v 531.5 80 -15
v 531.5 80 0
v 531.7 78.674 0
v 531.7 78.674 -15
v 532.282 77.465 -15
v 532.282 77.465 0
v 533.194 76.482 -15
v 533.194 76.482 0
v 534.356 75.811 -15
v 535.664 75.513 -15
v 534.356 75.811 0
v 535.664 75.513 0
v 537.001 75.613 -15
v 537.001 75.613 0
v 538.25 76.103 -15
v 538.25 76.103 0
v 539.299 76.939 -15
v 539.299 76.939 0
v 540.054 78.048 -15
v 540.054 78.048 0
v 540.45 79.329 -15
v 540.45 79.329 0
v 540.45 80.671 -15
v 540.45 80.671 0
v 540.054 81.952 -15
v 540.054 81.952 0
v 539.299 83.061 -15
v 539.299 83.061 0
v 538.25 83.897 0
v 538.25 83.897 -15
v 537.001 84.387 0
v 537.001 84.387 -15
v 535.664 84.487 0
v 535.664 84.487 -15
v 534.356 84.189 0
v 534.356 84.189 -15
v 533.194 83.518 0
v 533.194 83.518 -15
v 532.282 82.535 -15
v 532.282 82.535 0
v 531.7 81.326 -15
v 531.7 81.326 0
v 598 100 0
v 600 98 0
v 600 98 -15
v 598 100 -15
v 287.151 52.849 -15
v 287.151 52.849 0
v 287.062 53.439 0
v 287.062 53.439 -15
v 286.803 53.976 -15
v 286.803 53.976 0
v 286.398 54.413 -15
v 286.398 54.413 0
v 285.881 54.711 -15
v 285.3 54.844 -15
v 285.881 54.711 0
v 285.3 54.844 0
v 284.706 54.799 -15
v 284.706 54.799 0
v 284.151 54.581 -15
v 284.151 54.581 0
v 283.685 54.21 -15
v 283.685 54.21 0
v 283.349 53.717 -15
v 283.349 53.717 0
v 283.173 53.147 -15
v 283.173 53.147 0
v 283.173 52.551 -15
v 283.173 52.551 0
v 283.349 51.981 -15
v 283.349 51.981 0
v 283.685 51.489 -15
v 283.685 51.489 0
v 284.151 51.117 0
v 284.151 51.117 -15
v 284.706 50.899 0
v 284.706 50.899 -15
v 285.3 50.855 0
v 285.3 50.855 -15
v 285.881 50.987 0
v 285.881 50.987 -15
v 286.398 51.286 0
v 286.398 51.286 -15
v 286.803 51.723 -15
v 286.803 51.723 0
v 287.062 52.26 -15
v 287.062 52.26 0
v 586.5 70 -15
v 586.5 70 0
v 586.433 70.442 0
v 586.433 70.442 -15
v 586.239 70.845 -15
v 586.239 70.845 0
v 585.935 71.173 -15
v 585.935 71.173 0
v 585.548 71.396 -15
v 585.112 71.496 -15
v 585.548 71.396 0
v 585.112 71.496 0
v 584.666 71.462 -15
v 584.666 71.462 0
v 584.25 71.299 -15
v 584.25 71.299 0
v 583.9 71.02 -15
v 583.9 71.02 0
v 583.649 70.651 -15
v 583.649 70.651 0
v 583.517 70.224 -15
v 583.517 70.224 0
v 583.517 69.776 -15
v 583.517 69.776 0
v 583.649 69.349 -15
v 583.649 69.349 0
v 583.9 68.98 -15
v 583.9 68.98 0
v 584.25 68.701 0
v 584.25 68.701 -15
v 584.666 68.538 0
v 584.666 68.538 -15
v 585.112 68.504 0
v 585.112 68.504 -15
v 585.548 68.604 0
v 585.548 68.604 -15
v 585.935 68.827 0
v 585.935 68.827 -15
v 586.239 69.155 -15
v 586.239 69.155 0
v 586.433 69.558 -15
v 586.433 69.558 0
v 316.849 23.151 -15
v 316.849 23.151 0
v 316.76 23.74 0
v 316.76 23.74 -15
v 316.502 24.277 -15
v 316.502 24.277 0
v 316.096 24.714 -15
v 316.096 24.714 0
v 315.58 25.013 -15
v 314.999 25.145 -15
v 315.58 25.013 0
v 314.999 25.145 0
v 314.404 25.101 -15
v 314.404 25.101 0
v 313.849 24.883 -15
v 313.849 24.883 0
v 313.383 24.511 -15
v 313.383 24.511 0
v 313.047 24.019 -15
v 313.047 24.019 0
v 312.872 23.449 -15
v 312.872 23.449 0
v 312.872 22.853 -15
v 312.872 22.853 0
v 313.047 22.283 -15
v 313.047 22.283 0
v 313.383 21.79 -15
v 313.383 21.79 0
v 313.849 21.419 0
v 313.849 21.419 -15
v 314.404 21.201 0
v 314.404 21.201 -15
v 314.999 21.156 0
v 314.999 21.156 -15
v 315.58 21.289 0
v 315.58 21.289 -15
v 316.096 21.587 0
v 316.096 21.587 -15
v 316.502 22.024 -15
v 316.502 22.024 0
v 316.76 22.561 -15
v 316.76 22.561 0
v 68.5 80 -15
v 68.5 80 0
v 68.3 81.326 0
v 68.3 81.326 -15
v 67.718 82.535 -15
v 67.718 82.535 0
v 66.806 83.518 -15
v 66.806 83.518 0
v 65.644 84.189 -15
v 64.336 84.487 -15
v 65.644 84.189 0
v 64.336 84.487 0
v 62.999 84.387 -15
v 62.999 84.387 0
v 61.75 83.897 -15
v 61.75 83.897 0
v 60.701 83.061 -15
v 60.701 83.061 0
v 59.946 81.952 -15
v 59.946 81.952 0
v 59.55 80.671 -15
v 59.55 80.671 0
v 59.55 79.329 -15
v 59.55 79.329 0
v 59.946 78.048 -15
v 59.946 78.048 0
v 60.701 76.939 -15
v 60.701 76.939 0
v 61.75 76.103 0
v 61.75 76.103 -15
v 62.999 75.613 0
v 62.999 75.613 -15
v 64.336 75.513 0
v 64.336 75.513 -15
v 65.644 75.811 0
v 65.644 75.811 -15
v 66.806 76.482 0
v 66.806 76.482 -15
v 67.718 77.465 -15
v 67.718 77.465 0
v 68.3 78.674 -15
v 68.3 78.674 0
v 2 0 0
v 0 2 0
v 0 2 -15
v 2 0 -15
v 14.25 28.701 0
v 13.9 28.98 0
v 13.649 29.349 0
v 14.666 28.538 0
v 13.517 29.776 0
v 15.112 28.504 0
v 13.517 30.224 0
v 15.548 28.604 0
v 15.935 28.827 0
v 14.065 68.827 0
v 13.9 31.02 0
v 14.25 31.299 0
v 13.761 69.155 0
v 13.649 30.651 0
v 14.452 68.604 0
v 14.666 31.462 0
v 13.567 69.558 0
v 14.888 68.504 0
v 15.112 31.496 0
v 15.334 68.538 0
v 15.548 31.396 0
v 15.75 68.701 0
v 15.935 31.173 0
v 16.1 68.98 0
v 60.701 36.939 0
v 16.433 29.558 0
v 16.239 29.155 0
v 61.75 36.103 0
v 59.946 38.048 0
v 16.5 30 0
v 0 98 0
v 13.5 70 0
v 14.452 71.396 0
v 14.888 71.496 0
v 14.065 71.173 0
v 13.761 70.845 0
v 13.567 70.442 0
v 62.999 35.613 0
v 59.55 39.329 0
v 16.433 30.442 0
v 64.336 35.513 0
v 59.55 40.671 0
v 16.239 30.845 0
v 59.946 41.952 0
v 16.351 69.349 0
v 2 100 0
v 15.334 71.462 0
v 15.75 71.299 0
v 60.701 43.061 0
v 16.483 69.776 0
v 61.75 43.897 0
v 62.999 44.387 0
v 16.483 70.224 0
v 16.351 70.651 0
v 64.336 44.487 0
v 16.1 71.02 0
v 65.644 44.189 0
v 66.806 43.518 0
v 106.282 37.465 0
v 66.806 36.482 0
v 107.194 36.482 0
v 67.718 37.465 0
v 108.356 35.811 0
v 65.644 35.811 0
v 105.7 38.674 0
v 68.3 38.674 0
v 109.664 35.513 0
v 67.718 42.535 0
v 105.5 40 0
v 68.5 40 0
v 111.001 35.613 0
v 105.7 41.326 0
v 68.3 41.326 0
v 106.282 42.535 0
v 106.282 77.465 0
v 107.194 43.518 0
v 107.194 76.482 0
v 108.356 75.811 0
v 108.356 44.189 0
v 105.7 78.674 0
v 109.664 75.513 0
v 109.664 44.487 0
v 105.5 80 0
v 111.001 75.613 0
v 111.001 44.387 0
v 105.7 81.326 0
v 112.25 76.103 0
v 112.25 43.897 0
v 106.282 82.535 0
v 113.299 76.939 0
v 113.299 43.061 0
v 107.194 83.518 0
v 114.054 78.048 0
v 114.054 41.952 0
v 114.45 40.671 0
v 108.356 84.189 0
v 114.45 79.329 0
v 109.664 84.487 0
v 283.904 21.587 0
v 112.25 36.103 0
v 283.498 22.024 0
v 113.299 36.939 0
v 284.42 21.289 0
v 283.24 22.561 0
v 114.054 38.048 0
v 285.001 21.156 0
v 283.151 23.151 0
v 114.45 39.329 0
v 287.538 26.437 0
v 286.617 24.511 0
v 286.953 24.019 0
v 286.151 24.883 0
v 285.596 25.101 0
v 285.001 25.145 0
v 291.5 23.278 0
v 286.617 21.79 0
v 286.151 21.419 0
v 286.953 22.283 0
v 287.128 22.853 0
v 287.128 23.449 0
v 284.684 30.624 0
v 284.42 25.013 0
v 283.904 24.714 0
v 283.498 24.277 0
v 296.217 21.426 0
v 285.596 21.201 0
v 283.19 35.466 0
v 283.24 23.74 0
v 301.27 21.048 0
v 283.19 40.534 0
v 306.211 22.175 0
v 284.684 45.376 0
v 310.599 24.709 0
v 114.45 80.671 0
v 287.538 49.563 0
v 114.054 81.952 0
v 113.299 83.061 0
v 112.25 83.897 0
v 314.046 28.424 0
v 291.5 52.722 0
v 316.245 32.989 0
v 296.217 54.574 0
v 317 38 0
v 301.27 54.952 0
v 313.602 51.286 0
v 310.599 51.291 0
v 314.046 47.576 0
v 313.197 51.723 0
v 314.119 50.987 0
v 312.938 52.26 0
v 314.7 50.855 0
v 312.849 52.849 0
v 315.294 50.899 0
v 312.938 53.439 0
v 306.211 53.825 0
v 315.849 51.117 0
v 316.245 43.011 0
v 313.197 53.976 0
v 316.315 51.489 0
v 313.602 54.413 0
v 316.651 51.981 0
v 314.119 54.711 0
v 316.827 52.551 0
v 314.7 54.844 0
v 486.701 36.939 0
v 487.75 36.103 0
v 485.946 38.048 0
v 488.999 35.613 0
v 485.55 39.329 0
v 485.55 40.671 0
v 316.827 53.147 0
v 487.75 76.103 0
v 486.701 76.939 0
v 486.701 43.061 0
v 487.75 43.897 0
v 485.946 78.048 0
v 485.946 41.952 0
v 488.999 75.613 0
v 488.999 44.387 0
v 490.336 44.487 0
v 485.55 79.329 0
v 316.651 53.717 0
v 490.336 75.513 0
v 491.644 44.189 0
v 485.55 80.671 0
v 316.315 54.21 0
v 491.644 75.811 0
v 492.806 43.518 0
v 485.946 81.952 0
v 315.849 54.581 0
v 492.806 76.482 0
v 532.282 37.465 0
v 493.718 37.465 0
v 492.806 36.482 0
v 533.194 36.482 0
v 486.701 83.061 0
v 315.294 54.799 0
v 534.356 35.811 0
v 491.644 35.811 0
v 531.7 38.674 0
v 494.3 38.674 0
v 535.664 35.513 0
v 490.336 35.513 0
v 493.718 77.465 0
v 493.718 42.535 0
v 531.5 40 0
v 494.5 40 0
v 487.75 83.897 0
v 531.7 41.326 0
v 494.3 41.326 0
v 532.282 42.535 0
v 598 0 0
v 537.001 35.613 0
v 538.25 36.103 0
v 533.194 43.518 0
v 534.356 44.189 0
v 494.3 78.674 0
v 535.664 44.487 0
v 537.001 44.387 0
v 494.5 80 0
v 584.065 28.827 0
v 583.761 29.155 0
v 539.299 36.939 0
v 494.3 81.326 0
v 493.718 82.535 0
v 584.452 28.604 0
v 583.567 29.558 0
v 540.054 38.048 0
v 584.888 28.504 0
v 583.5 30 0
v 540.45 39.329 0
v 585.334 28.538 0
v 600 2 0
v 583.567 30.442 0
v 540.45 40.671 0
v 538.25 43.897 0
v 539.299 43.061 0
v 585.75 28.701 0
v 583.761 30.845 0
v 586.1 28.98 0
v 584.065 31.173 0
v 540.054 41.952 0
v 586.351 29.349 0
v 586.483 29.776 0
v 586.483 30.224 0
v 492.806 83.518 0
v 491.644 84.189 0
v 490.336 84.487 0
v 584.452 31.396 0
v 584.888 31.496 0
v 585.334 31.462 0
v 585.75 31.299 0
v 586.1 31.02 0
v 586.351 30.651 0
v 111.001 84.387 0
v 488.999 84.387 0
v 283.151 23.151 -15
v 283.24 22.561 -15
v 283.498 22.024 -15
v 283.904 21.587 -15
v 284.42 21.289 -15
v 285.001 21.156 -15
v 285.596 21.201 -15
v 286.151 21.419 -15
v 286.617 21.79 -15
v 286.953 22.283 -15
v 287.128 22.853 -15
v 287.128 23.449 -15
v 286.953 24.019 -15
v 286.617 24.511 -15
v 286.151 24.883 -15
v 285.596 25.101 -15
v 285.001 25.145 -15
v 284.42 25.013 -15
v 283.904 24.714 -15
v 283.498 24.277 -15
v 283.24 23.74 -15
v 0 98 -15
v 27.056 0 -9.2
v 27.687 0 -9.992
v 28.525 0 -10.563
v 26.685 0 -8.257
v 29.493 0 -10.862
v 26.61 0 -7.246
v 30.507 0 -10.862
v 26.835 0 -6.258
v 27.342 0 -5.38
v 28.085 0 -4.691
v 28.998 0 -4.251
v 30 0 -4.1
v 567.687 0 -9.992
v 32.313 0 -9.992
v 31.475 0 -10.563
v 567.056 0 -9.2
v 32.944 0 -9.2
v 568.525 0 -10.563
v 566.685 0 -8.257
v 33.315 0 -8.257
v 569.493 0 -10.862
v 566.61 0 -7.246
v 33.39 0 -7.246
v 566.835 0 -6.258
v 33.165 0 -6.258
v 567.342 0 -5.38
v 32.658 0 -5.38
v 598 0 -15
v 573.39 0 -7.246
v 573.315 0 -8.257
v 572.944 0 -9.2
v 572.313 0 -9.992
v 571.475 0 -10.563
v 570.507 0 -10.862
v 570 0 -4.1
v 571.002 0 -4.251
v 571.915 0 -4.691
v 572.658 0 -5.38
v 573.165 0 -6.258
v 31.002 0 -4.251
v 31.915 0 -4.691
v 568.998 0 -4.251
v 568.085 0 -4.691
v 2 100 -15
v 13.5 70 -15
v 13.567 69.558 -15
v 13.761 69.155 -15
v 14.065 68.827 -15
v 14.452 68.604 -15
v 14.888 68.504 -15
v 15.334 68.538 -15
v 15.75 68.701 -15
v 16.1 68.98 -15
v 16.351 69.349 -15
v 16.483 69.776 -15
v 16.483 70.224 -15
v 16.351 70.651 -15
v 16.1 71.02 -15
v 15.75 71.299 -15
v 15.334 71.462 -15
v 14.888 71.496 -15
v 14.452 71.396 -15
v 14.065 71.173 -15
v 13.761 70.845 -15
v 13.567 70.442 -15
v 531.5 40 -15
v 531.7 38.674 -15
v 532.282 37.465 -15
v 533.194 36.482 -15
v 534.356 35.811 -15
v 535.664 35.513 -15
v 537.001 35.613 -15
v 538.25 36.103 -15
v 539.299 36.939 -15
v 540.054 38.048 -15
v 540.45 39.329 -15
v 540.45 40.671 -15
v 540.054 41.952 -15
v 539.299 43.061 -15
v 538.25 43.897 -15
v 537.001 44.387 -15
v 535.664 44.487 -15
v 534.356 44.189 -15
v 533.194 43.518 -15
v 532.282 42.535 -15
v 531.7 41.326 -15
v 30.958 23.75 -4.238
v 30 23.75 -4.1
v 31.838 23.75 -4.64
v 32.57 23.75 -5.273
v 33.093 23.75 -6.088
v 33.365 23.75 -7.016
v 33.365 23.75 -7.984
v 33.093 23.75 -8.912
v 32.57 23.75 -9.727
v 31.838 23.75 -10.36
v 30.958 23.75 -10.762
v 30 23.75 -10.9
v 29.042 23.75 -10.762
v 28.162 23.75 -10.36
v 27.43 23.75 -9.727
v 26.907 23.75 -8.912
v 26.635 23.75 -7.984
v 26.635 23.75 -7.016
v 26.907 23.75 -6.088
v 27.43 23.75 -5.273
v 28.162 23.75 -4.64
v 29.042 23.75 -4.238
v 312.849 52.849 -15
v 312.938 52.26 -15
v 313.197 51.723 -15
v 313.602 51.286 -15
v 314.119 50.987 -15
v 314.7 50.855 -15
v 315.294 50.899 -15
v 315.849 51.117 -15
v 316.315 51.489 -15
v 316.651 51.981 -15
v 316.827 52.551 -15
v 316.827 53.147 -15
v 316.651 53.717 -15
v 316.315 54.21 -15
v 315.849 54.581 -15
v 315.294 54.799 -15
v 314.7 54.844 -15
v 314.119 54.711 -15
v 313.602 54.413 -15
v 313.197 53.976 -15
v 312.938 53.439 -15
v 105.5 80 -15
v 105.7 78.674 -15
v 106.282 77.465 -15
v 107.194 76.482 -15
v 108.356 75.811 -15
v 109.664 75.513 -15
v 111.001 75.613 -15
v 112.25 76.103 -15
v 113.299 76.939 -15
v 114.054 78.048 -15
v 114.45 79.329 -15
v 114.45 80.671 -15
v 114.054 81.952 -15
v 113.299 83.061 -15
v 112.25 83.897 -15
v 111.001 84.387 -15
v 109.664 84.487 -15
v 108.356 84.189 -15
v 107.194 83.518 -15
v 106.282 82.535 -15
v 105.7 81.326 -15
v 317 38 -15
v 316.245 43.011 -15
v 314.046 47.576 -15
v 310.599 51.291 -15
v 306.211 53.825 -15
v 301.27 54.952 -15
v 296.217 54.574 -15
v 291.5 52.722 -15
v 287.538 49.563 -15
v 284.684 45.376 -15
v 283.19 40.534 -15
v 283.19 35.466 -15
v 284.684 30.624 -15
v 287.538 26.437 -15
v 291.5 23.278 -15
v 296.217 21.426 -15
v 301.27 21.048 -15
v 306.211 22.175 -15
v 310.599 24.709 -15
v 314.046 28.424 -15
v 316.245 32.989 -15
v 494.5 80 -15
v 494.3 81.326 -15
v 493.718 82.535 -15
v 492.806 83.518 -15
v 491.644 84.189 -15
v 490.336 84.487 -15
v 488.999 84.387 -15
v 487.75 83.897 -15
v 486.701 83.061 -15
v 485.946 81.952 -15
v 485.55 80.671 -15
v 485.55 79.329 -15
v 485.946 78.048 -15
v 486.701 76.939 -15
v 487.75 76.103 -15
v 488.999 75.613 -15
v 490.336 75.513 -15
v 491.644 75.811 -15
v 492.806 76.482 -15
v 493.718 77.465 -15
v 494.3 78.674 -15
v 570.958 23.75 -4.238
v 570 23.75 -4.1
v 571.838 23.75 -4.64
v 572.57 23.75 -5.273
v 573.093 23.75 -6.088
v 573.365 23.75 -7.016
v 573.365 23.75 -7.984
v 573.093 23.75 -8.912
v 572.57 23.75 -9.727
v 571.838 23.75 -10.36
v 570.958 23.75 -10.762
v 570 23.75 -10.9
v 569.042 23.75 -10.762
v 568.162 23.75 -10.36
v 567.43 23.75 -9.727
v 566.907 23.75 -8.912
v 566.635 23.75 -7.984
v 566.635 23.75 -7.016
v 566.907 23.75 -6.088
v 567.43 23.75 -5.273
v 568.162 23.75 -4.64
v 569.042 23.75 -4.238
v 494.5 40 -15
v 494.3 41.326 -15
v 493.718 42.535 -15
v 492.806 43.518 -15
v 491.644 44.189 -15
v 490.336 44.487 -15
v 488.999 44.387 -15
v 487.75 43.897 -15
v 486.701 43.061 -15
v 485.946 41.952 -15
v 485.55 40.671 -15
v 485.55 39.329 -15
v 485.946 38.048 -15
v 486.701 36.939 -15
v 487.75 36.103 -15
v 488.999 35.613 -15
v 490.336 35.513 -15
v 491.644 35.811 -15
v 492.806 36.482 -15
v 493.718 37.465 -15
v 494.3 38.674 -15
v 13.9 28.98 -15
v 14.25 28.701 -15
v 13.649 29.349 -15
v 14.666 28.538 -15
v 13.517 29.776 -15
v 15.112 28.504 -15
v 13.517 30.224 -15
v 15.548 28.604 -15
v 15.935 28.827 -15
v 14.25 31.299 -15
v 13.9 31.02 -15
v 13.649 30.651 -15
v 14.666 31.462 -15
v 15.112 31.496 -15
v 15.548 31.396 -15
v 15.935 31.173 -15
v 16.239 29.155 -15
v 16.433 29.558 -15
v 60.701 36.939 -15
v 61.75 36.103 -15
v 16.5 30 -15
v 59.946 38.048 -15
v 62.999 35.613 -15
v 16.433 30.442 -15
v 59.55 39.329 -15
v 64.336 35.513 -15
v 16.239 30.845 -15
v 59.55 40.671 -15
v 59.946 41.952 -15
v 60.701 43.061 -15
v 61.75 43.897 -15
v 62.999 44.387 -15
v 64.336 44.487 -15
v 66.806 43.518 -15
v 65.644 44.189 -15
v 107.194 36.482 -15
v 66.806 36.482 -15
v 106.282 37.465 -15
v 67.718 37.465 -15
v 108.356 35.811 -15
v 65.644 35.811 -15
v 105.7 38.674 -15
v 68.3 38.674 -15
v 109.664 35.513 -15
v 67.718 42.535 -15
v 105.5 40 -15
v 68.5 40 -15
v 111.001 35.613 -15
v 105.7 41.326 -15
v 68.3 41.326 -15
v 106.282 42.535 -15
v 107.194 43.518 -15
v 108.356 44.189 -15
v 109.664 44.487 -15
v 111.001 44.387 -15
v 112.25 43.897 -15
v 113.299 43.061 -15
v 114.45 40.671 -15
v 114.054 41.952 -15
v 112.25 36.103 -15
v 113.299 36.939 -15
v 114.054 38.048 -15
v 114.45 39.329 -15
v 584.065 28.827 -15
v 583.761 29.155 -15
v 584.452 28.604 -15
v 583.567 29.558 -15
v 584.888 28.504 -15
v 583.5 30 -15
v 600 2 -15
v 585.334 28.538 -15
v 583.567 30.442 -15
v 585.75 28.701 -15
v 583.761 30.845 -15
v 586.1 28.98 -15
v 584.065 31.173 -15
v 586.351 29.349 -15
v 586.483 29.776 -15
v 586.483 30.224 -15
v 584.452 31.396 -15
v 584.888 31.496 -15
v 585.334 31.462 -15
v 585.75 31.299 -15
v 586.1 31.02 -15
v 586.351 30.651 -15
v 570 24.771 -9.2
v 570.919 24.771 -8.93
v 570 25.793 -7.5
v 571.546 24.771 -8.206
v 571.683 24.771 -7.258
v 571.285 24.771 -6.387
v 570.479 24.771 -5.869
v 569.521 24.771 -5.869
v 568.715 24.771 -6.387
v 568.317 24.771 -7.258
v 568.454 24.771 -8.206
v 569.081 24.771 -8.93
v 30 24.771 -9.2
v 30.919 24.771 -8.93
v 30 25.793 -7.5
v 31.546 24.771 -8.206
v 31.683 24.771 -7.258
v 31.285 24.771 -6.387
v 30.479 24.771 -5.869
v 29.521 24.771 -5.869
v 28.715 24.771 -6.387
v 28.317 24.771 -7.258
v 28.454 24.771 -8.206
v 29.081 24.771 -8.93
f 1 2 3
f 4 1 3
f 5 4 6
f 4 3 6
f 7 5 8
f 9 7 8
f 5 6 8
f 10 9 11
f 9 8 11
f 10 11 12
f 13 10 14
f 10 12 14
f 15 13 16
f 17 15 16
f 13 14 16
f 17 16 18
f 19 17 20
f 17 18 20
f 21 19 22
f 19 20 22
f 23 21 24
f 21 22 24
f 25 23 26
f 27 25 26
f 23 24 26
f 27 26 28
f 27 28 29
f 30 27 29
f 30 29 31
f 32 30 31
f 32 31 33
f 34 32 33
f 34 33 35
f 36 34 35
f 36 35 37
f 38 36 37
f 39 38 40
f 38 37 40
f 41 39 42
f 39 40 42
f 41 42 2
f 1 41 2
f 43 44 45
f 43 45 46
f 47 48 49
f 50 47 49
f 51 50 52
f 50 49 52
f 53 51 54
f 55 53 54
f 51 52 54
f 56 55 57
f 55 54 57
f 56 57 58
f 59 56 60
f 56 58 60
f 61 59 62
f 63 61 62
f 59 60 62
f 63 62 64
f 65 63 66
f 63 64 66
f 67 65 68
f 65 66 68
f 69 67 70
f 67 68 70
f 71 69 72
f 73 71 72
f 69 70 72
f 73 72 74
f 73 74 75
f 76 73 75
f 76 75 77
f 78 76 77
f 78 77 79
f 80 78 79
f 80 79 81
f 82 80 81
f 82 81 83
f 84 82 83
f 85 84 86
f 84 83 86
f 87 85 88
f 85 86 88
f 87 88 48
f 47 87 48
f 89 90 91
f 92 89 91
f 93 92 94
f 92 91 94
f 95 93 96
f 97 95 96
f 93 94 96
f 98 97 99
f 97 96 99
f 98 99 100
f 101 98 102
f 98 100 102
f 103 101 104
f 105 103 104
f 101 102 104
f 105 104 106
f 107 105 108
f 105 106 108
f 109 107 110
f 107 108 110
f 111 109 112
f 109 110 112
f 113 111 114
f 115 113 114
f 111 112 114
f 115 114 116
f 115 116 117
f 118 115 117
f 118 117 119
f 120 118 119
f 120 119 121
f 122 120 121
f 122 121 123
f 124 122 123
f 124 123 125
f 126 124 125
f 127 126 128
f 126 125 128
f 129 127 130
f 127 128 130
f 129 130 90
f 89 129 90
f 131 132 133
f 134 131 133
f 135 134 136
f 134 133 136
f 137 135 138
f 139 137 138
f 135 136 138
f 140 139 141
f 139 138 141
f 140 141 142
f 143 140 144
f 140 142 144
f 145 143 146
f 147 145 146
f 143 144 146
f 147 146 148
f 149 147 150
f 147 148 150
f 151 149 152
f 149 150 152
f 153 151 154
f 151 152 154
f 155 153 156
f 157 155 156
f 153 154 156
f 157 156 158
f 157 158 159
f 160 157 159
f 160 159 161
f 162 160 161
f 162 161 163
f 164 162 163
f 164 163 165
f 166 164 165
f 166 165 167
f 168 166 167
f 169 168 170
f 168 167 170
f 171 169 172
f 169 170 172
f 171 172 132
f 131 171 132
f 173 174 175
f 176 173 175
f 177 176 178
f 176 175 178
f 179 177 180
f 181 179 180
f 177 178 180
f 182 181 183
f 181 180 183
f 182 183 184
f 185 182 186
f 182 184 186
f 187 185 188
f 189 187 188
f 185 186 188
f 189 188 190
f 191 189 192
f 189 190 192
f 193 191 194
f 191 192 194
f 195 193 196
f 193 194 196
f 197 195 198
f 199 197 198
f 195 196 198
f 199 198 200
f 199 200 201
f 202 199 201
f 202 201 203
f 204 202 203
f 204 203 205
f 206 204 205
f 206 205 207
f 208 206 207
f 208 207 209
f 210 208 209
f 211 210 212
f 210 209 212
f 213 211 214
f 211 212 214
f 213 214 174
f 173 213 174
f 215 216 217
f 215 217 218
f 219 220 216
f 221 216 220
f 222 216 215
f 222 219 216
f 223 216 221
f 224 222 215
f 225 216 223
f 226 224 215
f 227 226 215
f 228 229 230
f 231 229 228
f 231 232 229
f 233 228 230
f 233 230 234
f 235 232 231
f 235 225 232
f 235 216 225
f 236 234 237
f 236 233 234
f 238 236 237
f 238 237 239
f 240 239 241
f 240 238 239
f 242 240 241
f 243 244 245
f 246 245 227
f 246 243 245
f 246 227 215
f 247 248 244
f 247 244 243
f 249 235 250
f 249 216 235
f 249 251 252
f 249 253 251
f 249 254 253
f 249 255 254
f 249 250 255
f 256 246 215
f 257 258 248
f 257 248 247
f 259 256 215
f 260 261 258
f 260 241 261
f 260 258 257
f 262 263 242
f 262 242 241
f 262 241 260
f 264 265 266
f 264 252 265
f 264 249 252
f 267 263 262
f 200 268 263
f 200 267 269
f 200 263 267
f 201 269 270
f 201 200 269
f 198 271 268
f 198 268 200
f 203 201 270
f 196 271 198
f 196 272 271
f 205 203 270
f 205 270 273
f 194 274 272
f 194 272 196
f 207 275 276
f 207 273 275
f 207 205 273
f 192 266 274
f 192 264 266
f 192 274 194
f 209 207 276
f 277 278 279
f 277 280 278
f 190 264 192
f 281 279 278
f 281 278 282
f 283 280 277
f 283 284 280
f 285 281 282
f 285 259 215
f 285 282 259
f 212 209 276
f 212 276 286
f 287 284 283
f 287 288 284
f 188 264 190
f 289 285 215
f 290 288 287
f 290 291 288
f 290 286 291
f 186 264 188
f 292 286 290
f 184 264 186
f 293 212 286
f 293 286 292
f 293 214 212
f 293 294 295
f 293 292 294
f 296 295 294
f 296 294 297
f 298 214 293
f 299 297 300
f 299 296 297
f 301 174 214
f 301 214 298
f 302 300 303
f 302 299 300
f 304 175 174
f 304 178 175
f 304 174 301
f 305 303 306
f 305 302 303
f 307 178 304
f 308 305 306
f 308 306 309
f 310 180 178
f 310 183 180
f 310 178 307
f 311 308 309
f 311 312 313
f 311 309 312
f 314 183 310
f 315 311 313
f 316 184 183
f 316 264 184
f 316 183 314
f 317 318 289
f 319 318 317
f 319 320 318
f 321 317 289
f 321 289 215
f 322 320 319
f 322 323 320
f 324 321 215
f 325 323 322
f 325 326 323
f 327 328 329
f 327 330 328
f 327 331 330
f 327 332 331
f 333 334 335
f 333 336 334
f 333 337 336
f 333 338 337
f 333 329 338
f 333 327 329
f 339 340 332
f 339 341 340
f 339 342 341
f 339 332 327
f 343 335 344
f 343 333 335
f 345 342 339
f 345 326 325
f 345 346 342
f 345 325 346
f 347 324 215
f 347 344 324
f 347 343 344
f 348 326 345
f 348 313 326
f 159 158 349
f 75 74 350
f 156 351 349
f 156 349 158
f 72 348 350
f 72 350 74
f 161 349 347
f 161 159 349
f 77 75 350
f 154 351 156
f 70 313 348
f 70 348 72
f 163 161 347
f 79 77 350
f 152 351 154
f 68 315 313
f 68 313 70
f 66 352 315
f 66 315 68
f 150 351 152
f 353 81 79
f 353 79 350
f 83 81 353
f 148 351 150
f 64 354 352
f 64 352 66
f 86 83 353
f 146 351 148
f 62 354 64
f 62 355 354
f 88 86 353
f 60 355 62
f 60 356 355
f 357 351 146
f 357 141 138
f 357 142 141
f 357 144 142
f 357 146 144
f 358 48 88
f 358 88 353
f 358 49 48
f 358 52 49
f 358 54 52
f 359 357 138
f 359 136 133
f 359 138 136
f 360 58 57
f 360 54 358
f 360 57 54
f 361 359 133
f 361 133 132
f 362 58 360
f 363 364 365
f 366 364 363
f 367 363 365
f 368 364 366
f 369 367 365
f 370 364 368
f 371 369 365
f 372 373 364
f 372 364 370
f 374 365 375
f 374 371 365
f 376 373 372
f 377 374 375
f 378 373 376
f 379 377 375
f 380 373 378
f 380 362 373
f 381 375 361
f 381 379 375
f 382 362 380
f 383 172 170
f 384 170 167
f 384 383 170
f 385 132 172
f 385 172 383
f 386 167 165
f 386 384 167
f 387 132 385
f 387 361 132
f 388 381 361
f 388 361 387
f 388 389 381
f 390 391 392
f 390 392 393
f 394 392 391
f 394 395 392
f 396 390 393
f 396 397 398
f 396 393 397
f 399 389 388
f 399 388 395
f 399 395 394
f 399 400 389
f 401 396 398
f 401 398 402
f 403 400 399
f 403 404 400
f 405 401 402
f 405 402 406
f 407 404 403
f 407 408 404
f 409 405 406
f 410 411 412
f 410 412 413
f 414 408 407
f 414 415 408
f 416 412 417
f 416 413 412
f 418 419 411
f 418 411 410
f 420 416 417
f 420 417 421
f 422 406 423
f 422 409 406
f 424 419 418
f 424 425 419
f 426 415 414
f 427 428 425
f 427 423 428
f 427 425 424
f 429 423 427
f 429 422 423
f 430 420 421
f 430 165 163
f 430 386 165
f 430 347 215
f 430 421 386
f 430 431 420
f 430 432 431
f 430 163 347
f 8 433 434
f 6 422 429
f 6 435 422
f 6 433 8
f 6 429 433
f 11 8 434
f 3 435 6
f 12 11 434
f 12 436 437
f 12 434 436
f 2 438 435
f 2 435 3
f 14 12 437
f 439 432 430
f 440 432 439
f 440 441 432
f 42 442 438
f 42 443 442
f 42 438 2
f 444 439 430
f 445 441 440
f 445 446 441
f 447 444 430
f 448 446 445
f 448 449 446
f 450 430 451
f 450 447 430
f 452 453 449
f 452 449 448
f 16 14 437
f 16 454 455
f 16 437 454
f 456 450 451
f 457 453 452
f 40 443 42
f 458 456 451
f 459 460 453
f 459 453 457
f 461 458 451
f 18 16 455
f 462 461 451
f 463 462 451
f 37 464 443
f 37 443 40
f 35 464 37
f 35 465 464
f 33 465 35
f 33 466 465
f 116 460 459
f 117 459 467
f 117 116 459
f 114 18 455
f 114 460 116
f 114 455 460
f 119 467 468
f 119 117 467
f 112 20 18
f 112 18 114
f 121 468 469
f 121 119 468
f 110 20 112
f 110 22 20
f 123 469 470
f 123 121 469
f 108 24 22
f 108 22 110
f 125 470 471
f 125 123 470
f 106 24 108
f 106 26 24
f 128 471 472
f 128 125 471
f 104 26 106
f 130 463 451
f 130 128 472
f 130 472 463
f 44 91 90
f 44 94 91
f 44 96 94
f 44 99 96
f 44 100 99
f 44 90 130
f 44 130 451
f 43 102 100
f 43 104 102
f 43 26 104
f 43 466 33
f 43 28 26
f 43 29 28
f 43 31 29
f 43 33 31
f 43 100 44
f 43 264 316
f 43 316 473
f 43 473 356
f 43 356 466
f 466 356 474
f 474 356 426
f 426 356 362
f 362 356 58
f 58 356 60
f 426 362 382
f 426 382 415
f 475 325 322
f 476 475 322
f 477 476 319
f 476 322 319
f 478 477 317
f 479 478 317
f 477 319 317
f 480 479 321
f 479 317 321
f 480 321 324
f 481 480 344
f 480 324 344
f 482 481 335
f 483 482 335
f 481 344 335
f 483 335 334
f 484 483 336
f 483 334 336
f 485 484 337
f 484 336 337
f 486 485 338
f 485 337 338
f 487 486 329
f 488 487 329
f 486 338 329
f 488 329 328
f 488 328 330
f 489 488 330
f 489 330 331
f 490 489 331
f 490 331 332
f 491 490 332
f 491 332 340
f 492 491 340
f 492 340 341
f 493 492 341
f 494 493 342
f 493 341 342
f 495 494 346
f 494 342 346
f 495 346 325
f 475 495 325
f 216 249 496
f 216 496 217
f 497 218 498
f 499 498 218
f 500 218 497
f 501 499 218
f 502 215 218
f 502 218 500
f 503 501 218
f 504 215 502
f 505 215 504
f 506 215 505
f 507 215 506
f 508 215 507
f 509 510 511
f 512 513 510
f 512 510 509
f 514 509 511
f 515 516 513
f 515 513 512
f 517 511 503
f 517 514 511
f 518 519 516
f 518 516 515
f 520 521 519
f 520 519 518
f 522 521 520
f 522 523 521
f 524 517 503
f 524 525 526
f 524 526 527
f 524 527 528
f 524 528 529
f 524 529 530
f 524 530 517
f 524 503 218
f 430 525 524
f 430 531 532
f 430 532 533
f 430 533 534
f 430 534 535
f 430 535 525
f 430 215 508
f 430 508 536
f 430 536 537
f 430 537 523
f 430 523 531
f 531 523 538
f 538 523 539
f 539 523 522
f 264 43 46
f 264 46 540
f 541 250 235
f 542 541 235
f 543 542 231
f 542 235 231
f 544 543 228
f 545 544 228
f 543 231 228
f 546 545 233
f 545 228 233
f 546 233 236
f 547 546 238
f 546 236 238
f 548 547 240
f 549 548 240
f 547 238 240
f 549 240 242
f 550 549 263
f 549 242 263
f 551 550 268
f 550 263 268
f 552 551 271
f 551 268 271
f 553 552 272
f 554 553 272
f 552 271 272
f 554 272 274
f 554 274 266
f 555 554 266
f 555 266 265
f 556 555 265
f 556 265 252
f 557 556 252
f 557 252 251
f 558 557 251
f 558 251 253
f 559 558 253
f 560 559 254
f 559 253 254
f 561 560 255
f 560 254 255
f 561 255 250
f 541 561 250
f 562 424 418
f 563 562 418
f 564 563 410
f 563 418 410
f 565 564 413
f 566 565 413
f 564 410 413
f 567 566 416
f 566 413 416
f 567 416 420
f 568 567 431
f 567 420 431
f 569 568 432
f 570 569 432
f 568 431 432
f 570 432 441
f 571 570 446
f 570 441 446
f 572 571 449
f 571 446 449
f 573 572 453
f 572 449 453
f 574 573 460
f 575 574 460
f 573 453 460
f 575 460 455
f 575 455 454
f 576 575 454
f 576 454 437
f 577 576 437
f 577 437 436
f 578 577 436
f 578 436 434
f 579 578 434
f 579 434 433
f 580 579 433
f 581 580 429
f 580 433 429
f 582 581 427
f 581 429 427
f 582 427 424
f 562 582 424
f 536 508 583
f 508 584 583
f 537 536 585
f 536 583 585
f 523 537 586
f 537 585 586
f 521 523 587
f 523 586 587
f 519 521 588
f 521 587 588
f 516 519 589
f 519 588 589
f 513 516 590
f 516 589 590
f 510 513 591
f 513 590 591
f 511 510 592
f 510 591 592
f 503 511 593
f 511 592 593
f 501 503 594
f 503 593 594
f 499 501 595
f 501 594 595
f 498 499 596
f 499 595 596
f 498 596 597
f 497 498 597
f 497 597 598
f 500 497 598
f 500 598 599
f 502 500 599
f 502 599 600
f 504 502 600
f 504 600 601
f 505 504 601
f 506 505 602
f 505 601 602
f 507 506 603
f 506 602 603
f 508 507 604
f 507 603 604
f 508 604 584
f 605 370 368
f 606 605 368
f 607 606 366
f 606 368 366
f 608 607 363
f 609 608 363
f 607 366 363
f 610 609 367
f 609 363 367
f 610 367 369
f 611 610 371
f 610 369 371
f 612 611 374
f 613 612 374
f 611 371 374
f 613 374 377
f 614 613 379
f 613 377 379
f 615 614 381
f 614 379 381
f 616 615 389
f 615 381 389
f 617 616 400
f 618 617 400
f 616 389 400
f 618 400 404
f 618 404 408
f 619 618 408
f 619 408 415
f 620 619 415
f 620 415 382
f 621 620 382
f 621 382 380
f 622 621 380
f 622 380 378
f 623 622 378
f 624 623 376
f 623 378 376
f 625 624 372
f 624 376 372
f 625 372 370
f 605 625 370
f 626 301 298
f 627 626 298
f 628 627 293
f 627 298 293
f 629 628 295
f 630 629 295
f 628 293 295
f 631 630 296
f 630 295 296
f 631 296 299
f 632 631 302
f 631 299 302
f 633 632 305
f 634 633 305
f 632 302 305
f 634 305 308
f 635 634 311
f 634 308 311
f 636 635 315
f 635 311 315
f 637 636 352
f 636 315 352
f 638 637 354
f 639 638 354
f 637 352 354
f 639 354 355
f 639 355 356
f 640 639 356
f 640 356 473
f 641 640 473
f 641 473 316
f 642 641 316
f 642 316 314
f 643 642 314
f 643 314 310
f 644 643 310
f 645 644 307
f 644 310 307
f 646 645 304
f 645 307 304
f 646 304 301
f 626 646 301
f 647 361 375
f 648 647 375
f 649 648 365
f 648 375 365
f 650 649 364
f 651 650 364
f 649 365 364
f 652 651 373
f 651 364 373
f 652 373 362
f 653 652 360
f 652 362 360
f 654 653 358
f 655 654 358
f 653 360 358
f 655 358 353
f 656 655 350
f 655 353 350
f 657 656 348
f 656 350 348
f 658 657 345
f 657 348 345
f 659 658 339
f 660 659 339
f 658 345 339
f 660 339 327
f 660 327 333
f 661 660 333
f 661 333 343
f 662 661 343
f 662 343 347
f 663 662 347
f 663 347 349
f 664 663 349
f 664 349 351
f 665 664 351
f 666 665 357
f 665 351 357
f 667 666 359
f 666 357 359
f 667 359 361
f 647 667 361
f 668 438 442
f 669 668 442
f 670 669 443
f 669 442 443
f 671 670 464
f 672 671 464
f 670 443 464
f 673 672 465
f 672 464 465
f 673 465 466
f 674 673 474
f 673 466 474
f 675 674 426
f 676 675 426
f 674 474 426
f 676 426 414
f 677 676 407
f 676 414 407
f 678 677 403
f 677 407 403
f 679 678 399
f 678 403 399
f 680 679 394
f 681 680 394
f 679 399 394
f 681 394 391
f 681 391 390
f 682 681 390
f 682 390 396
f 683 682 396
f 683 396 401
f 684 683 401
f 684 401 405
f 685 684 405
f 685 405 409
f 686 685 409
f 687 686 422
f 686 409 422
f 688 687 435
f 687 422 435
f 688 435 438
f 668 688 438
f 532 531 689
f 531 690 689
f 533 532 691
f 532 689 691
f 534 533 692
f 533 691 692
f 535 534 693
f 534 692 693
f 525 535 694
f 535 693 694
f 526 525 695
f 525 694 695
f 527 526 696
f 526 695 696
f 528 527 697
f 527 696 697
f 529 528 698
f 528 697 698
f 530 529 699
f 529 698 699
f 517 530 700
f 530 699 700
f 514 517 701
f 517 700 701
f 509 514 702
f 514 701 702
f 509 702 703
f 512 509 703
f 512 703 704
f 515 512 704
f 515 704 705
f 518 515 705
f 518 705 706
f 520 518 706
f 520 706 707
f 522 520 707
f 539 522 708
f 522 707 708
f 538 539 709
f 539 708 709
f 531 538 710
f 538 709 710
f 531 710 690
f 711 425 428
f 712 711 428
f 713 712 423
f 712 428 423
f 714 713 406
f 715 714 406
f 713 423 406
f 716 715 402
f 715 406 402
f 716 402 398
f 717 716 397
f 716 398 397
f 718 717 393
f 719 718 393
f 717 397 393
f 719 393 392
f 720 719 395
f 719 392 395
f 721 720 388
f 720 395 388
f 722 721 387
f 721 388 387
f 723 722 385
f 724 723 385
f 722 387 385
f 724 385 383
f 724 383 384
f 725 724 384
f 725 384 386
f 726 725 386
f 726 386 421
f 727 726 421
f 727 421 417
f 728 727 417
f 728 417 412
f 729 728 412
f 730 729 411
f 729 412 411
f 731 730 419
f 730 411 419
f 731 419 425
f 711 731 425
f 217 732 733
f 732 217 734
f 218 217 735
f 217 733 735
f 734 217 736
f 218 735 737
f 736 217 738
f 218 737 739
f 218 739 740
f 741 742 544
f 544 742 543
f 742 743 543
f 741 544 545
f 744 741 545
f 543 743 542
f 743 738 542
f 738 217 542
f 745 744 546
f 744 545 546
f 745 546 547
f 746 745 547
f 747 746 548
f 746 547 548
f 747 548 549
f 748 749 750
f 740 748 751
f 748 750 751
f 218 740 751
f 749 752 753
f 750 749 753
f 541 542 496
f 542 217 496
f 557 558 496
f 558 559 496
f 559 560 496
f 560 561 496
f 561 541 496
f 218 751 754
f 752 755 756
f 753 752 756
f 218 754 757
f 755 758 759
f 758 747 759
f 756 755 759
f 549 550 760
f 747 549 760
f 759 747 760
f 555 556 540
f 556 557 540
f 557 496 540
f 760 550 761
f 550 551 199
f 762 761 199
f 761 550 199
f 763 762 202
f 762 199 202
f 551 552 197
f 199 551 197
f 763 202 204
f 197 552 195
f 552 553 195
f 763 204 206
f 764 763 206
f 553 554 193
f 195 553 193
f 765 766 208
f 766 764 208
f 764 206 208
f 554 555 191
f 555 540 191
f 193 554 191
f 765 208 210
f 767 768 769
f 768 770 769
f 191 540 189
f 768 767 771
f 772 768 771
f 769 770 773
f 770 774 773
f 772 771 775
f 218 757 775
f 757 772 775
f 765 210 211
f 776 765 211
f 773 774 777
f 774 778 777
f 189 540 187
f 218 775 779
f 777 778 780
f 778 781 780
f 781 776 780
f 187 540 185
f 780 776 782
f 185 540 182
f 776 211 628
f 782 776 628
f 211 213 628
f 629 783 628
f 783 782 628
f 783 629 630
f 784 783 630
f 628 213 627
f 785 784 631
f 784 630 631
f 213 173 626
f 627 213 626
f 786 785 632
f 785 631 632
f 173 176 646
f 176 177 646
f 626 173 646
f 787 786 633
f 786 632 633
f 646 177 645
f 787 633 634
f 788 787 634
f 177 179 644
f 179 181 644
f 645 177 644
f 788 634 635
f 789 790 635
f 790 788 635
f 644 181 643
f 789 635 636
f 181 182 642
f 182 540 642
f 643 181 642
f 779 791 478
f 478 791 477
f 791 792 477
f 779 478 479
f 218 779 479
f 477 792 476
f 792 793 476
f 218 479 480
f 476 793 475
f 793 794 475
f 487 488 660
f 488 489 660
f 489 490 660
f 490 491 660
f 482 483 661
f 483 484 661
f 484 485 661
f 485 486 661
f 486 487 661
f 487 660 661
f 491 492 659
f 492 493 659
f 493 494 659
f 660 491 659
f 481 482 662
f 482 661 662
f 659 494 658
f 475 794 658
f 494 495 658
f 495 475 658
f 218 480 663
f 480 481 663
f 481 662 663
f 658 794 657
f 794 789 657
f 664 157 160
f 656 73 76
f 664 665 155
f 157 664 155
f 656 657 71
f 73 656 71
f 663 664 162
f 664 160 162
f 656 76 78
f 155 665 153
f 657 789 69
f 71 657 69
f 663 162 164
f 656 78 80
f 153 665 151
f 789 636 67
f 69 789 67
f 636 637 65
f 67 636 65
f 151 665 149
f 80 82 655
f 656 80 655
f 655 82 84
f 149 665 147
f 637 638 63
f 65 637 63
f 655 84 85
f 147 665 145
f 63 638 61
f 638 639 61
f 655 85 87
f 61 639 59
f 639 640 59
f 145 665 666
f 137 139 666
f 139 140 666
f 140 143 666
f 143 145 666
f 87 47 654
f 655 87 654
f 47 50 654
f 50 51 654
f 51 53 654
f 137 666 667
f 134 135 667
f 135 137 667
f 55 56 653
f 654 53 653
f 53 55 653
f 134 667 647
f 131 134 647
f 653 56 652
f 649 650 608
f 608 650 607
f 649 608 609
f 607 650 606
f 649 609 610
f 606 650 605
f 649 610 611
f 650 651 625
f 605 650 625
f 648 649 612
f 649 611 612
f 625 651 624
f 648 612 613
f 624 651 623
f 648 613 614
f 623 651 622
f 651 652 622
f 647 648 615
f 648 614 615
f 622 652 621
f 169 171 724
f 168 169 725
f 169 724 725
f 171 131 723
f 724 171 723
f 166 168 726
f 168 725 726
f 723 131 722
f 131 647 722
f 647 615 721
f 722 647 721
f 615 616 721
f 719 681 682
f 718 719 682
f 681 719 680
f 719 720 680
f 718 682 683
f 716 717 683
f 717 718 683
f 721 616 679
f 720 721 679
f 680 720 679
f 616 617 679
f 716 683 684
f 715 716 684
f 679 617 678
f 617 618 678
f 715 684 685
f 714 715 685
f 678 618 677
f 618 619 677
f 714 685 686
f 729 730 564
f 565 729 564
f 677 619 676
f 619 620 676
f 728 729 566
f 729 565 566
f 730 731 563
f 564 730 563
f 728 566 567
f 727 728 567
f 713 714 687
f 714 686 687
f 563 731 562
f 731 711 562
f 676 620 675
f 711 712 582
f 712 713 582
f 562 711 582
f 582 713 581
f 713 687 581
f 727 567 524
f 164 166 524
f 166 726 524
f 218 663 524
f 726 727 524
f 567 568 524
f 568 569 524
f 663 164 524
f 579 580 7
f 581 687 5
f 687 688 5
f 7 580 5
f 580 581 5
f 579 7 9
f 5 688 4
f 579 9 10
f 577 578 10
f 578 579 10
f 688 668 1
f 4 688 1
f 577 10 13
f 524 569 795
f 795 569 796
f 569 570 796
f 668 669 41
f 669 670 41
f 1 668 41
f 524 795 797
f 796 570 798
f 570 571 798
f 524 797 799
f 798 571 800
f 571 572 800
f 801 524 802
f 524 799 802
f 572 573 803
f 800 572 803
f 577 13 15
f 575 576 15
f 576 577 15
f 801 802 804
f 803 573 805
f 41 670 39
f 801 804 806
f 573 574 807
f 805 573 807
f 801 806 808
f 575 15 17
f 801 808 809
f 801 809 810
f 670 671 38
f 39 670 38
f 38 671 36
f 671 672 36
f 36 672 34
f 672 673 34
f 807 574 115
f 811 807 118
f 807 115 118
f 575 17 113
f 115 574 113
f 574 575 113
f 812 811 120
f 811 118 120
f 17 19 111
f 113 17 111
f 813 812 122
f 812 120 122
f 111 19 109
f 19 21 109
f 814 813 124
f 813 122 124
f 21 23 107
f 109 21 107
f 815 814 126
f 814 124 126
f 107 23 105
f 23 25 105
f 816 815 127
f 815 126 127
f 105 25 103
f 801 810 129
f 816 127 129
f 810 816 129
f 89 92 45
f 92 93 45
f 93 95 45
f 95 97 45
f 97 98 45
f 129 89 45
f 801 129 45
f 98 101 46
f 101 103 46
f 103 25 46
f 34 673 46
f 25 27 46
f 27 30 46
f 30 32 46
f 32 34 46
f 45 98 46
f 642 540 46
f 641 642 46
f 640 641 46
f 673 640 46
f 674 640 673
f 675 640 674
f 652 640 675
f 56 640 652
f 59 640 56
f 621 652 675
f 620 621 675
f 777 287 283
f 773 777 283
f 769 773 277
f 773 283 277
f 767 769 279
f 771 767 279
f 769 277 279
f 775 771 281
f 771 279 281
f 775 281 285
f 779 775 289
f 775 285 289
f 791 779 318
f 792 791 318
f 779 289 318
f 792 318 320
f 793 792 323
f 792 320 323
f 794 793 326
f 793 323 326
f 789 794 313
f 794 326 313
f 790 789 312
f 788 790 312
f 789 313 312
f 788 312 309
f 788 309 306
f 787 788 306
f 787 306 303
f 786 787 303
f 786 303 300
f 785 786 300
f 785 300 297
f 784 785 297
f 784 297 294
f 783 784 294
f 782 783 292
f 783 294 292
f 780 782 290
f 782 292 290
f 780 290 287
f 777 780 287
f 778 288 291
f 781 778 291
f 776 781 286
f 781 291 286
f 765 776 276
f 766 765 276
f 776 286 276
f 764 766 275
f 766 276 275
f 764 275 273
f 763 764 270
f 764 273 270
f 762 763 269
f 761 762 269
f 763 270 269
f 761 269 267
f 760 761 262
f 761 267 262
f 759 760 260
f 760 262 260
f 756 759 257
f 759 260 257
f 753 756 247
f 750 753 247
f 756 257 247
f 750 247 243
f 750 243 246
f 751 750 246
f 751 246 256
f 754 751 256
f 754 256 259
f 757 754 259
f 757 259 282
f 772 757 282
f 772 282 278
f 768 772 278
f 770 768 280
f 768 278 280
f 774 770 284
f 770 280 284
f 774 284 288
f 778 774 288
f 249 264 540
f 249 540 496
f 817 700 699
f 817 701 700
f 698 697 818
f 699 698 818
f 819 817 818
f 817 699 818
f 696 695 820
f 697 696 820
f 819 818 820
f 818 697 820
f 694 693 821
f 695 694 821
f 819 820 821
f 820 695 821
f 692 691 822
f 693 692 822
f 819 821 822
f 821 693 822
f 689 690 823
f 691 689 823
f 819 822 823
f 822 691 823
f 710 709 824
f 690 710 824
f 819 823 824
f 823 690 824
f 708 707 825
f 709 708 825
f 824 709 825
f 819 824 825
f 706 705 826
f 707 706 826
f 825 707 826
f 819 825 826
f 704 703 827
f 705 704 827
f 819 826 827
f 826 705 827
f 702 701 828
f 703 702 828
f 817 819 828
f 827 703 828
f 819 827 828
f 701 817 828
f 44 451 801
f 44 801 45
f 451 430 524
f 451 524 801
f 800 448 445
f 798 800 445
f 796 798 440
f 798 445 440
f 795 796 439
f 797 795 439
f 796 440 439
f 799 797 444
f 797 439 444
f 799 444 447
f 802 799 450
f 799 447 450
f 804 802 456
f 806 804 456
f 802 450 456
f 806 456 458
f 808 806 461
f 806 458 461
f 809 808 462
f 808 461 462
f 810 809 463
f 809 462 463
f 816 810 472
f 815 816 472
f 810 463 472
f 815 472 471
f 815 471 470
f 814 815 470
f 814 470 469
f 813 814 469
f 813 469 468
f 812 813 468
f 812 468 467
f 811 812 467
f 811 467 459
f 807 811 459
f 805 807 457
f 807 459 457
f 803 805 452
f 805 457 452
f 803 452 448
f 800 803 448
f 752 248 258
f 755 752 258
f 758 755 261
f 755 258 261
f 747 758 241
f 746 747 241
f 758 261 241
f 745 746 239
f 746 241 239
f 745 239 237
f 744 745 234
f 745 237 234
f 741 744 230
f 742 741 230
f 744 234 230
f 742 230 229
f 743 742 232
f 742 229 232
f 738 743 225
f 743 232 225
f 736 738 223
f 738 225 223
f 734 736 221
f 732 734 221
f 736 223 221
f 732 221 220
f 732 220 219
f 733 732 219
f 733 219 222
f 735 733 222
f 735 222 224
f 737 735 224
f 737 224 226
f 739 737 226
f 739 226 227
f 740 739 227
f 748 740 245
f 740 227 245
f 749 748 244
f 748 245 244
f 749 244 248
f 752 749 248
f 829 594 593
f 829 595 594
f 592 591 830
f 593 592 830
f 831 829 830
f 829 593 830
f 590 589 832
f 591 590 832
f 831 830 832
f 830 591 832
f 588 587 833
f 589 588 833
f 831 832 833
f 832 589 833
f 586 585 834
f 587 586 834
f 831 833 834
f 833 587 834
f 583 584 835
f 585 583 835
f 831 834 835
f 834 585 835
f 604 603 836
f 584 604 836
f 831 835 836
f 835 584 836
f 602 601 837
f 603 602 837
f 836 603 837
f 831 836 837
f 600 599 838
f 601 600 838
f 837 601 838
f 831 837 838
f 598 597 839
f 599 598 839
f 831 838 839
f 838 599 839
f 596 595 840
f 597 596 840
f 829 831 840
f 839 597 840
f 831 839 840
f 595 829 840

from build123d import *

# Parameters (mm, degrees)
SCHIZZO1_R                   = 17
SCHIZZO1_R_2                 = 2
SCHIZZO1_R_3                 = 4.5
SCHIZZO1_R_4                 = 1.5
ESTRUSIONE_ESTRUSIONE1_DEPTH = 15
M8_TAPPED_HOLE1_D            = 6.8
M8_TAPPED_HOLE1_DEPTH        = 23.75
M8_TAPPED_HOLE1_TIP          = 2.042926105


with BuildPart() as part:
    # Schizzo1 → Estrusione-Estrusione1 (new body)
    with BuildSketch(Plane.XY):
        Polygon((2, 0), (598, 0), (600, 2), (600, 98), (598, 100), (2, 100), (0, 98), (0, 2), align=None)
        with Locations((300, 38)):
            Circle(SCHIZZO1_R, mode=Mode.SUBTRACT)
        with Locations(Location((314.849242405, 52.849242405, 0), (0, 0, 180))):
            Circle(SCHIZZO1_R_2, mode=Mode.SUBTRACT)
        with Locations(Location((110, 40, 0), (0, 0, 180))):
            Circle(SCHIZZO1_R_3, mode=Mode.SUBTRACT)
        with Locations((314.849242405, 23.150757595)):
            Circle(SCHIZZO1_R_2, mode=Mode.SUBTRACT)
        with Locations(Location((285.150757595, 23.150757595, 0), (0, 0, 180))):
            Circle(SCHIZZO1_R_2, mode=Mode.SUBTRACT)
        with Locations(Location((110, 80, 0), (0, 0, 180))):
            Circle(SCHIZZO1_R_3, mode=Mode.SUBTRACT)
        with Locations(Location((536, 40, 0), (0, 0, 180))):
            Circle(SCHIZZO1_R_3, mode=Mode.SUBTRACT)
        with Locations((64, 40)):
            Circle(SCHIZZO1_R_3, mode=Mode.SUBTRACT)
        with Locations((64, 80)):
            Circle(SCHIZZO1_R_3, mode=Mode.SUBTRACT)
        with Locations((490, 40)):
            Circle(SCHIZZO1_R_3, mode=Mode.SUBTRACT)
        with Locations((15, 30)):
            Circle(SCHIZZO1_R_4, mode=Mode.SUBTRACT)
        with Locations(Location((585, 30, 0), (0, 0, 180))):
            Circle(SCHIZZO1_R_4, mode=Mode.SUBTRACT)
        with Locations((285.150757595, 52.849242405)):
            Circle(SCHIZZO1_R_2, mode=Mode.SUBTRACT)
        with Locations((490, 80)):
            Circle(SCHIZZO1_R_3, mode=Mode.SUBTRACT)
        with Locations(Location((536, 80, 0), (0, 0, 180))):
            Circle(SCHIZZO1_R_3, mode=Mode.SUBTRACT)
        with Locations((585, 70)):
            Circle(SCHIZZO1_R_4, mode=Mode.SUBTRACT)
        with Locations(Location((15, 70, 0), (0, 0, 180))):
            Circle(SCHIZZO1_R_4, mode=Mode.SUBTRACT)
    extrude(amount=-ESTRUSIONE_ESTRUSIONE1_DEPTH)

    # M8 Tapped Hole1
    with Locations(Plane(origin=(30, 0, -7.5), x_dir=(0, 0, -1), z_dir=(0, -1, 0))):
        with Locations((0, 0), (0, 540)):
            Hole(M8_TAPPED_HOLE1_D / 2, depth=M8_TAPPED_HOLE1_DEPTH)
            with Locations((0, 0, -(M8_TAPPED_HOLE1_DEPTH + M8_TAPPED_HOLE1_TIP / 2))):  # 118° drill point
                Cone(0, M8_TAPPED_HOLE1_D / 2, M8_TAPPED_HOLE1_TIP, mode=Mode.SUBTRACT)


solid = part.part
